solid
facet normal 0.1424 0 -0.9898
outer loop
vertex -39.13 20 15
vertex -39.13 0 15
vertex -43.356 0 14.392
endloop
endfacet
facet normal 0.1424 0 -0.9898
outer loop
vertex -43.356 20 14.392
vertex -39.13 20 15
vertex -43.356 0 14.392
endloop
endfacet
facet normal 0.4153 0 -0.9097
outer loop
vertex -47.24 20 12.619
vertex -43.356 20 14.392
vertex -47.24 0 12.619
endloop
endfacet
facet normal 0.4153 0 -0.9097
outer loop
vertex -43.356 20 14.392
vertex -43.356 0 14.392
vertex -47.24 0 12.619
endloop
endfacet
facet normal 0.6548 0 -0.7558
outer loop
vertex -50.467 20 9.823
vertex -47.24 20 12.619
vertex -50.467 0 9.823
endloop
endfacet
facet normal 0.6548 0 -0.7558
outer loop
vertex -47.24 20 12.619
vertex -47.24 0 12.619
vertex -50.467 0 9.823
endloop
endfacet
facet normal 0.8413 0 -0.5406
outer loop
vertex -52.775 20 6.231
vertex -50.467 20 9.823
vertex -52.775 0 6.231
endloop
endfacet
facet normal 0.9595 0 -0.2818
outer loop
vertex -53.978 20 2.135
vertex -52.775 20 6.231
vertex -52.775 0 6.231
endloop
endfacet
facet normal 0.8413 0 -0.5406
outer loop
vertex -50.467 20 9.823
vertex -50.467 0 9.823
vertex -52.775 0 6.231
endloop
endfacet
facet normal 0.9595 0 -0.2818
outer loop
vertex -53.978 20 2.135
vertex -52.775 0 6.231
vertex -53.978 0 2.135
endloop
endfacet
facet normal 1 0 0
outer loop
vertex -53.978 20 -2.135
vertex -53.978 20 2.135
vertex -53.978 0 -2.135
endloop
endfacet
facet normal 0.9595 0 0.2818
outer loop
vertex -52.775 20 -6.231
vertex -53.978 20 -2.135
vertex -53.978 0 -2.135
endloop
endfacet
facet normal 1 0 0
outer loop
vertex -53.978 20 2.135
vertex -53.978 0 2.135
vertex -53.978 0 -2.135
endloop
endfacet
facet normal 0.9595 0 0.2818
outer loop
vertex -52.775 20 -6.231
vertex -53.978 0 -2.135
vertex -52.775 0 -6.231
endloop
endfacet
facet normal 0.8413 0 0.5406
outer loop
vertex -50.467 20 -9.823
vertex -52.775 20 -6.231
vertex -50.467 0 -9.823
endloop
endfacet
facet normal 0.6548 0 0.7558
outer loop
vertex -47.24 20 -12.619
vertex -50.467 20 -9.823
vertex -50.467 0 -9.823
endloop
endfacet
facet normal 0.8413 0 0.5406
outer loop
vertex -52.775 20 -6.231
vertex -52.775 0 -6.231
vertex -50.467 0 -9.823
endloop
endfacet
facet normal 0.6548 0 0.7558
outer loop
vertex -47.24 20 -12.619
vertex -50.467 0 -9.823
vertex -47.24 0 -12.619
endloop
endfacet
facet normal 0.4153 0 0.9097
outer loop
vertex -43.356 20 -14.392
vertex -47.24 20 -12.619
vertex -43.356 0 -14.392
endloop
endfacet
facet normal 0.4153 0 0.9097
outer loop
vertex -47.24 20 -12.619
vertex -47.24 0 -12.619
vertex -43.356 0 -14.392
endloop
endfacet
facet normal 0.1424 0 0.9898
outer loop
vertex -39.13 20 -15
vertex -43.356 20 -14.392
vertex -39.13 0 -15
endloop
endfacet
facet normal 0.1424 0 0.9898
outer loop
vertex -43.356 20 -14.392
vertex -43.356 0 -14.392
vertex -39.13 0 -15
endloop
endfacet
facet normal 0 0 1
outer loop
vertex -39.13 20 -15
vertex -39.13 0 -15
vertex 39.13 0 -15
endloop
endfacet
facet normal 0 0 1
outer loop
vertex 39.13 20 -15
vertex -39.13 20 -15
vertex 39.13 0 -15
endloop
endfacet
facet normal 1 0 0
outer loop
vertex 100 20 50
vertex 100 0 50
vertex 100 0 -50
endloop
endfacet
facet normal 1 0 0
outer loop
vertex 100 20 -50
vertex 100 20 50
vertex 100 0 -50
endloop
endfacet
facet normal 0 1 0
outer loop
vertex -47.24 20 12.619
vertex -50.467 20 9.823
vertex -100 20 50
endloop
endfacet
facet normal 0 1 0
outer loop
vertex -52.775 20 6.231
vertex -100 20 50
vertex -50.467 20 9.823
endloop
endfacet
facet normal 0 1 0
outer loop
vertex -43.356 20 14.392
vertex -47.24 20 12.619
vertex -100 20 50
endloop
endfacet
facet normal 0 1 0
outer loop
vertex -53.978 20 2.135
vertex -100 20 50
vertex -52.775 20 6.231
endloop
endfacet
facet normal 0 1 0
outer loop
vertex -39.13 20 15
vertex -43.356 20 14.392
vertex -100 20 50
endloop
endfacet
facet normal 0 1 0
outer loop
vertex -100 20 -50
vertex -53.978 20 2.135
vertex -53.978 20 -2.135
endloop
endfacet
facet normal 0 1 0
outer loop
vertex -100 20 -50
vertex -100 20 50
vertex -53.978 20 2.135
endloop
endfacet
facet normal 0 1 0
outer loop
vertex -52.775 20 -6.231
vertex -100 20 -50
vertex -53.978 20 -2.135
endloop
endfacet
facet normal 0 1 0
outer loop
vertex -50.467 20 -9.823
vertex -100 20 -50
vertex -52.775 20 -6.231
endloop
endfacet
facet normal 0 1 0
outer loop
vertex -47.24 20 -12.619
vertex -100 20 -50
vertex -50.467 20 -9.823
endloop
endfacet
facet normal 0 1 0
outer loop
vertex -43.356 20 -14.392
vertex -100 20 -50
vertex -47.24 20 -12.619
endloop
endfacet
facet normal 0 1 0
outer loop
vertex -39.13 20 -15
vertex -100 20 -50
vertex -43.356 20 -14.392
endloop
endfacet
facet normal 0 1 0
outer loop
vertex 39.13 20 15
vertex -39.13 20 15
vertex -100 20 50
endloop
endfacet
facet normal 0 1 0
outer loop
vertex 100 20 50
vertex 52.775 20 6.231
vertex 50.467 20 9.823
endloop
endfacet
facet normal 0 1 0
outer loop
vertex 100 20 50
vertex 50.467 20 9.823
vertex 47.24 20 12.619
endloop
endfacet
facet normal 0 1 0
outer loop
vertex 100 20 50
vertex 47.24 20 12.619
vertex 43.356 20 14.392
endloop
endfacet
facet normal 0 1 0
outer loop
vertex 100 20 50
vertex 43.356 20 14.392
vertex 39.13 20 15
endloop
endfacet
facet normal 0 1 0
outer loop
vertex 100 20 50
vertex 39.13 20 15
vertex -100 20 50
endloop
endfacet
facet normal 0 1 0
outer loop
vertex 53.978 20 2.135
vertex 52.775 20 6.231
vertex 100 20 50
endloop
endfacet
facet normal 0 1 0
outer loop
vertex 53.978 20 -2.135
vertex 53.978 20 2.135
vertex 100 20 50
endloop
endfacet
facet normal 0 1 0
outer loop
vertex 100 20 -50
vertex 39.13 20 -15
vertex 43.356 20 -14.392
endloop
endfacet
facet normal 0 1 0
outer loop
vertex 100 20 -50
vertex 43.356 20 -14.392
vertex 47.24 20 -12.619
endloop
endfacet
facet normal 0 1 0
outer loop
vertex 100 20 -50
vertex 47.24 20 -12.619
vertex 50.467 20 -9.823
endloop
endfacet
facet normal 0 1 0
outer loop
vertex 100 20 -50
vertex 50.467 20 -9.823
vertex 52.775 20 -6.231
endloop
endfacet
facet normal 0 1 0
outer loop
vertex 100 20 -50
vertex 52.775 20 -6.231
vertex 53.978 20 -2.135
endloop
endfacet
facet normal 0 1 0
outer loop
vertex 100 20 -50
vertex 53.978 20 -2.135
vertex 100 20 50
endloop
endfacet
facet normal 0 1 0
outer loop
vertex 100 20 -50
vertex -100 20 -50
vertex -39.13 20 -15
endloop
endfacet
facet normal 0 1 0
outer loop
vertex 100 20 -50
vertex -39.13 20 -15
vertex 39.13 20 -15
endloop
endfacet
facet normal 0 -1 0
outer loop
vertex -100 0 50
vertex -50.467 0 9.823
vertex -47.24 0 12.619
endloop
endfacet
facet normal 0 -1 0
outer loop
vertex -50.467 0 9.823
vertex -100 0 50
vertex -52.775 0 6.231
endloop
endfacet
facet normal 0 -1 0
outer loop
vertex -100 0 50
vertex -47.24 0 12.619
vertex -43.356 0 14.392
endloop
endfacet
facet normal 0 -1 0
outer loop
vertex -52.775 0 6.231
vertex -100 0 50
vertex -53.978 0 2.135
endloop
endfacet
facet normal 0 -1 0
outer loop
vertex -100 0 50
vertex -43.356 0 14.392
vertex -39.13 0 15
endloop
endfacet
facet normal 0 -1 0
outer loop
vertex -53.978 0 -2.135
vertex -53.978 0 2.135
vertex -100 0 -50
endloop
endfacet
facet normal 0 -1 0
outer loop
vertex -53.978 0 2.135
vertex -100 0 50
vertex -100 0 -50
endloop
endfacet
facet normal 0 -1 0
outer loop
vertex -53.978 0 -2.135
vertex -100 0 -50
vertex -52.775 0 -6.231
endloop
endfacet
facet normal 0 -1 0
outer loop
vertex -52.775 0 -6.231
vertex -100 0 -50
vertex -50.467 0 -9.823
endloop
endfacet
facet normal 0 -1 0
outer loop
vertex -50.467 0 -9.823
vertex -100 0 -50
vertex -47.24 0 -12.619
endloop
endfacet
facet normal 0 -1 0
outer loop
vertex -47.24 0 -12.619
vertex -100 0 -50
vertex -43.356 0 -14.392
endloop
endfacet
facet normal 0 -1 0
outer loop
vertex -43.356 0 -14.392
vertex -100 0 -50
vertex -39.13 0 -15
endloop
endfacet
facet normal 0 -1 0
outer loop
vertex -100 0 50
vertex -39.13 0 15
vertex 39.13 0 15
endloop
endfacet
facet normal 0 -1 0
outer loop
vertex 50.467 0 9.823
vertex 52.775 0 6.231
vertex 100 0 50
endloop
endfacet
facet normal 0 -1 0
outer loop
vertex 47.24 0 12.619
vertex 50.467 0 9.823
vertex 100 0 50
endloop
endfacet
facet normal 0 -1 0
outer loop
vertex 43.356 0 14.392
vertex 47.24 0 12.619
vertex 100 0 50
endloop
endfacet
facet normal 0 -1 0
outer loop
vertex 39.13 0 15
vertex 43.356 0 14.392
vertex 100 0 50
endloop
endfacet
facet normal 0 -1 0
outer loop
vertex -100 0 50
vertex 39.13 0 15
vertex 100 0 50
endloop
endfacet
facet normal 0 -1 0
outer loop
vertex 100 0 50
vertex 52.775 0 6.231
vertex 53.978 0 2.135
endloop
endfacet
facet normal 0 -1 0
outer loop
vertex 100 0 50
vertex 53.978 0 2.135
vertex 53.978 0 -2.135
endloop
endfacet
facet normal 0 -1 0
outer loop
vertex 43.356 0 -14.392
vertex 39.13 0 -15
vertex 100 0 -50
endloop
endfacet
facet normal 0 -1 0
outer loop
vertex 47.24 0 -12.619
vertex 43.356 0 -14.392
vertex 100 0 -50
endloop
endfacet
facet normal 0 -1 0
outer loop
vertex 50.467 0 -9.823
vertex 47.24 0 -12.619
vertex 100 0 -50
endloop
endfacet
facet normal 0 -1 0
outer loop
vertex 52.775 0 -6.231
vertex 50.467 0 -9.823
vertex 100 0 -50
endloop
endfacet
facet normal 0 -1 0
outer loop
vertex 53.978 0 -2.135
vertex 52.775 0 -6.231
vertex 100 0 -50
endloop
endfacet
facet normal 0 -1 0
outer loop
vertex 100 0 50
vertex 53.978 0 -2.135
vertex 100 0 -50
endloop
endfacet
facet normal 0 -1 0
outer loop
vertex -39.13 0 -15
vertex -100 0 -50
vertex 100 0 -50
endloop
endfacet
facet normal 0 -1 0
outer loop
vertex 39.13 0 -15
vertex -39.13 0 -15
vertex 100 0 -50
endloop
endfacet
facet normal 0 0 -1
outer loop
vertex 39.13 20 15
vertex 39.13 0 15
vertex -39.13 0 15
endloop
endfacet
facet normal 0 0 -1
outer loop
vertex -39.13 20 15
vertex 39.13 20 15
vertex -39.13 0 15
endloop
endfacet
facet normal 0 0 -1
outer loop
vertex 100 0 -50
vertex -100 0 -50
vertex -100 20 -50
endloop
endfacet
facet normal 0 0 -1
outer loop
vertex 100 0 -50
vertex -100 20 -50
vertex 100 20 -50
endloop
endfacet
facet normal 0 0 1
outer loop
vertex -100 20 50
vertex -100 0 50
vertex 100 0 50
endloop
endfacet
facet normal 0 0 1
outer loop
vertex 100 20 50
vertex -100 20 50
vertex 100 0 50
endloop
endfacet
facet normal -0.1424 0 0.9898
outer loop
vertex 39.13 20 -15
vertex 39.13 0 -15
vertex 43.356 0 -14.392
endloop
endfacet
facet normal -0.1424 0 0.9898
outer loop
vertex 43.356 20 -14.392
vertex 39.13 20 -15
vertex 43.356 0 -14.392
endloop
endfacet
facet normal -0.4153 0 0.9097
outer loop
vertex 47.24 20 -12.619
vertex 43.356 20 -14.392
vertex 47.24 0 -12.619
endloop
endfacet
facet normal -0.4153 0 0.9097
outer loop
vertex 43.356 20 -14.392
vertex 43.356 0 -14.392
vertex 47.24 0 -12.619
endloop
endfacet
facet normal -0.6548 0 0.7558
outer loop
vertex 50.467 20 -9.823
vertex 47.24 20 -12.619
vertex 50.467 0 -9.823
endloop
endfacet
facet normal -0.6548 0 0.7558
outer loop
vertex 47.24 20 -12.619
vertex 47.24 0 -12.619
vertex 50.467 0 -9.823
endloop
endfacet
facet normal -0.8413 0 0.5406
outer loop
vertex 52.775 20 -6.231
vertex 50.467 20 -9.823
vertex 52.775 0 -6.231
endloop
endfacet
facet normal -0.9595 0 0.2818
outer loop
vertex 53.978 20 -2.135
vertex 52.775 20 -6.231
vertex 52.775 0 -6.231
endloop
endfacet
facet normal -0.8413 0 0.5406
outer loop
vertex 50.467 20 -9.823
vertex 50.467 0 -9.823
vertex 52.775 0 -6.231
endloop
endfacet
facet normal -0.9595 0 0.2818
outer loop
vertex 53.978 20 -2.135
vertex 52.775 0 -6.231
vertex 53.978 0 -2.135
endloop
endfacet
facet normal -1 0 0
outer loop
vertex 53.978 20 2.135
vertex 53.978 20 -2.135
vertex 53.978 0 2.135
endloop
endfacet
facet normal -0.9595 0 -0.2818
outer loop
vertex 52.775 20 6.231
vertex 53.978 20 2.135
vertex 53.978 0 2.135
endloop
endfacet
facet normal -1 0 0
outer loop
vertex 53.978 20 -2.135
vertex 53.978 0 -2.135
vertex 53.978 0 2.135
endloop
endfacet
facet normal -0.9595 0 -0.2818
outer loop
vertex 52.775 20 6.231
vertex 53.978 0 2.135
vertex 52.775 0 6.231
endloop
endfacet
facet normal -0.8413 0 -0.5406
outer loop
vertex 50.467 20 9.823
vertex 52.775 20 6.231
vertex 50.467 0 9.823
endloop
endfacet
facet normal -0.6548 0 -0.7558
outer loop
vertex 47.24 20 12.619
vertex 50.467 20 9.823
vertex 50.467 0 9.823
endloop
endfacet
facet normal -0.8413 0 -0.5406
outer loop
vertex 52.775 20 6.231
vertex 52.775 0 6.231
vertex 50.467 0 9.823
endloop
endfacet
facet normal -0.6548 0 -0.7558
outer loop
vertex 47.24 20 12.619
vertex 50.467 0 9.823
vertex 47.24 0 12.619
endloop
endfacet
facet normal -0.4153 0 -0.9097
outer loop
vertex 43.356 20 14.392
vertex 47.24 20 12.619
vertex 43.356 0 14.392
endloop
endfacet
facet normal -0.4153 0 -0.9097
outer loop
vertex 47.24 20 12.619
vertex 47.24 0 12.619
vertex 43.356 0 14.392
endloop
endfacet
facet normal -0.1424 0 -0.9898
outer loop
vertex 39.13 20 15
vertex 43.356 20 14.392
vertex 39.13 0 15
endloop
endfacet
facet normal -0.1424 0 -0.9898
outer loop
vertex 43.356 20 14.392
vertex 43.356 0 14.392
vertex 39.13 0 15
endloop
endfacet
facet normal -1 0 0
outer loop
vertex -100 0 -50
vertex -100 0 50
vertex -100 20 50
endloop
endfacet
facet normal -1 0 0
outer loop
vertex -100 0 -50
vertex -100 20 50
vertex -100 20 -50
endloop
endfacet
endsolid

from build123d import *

# Parameters (mm, degrees)
SKETCH2_W           = 200
SKETCH2_H           = 100
BOSS_EXTRUDE2_DEPTH = 20


with BuildPart() as part:
    # Sketch2 → Boss-Extrude2 (new body)
    with BuildSketch(Plane(origin=(0, 0, 0), x_dir=(1, 0, 0), z_dir=(0, 1, 0))):
        Rectangle(SKETCH2_W, SKETCH2_H)
        with BuildLine():
            Line((-39.130434783, 15), (39.130434783, 15))
            ThreePointArc((39.130434783, 15), (54.130434783, 0), (39.130434783, -15))
            Line((39.130434783, -15), (-39.130434783, -15))
            ThreePointArc((-39.130434783, -15), (-54.130434783, 0), (-39.130434783, 15))
        make_face(mode=Mode.SUBTRACT)
    extrude(amount=BOSS_EXTRUDE2_DEPTH)


solid = part.part
